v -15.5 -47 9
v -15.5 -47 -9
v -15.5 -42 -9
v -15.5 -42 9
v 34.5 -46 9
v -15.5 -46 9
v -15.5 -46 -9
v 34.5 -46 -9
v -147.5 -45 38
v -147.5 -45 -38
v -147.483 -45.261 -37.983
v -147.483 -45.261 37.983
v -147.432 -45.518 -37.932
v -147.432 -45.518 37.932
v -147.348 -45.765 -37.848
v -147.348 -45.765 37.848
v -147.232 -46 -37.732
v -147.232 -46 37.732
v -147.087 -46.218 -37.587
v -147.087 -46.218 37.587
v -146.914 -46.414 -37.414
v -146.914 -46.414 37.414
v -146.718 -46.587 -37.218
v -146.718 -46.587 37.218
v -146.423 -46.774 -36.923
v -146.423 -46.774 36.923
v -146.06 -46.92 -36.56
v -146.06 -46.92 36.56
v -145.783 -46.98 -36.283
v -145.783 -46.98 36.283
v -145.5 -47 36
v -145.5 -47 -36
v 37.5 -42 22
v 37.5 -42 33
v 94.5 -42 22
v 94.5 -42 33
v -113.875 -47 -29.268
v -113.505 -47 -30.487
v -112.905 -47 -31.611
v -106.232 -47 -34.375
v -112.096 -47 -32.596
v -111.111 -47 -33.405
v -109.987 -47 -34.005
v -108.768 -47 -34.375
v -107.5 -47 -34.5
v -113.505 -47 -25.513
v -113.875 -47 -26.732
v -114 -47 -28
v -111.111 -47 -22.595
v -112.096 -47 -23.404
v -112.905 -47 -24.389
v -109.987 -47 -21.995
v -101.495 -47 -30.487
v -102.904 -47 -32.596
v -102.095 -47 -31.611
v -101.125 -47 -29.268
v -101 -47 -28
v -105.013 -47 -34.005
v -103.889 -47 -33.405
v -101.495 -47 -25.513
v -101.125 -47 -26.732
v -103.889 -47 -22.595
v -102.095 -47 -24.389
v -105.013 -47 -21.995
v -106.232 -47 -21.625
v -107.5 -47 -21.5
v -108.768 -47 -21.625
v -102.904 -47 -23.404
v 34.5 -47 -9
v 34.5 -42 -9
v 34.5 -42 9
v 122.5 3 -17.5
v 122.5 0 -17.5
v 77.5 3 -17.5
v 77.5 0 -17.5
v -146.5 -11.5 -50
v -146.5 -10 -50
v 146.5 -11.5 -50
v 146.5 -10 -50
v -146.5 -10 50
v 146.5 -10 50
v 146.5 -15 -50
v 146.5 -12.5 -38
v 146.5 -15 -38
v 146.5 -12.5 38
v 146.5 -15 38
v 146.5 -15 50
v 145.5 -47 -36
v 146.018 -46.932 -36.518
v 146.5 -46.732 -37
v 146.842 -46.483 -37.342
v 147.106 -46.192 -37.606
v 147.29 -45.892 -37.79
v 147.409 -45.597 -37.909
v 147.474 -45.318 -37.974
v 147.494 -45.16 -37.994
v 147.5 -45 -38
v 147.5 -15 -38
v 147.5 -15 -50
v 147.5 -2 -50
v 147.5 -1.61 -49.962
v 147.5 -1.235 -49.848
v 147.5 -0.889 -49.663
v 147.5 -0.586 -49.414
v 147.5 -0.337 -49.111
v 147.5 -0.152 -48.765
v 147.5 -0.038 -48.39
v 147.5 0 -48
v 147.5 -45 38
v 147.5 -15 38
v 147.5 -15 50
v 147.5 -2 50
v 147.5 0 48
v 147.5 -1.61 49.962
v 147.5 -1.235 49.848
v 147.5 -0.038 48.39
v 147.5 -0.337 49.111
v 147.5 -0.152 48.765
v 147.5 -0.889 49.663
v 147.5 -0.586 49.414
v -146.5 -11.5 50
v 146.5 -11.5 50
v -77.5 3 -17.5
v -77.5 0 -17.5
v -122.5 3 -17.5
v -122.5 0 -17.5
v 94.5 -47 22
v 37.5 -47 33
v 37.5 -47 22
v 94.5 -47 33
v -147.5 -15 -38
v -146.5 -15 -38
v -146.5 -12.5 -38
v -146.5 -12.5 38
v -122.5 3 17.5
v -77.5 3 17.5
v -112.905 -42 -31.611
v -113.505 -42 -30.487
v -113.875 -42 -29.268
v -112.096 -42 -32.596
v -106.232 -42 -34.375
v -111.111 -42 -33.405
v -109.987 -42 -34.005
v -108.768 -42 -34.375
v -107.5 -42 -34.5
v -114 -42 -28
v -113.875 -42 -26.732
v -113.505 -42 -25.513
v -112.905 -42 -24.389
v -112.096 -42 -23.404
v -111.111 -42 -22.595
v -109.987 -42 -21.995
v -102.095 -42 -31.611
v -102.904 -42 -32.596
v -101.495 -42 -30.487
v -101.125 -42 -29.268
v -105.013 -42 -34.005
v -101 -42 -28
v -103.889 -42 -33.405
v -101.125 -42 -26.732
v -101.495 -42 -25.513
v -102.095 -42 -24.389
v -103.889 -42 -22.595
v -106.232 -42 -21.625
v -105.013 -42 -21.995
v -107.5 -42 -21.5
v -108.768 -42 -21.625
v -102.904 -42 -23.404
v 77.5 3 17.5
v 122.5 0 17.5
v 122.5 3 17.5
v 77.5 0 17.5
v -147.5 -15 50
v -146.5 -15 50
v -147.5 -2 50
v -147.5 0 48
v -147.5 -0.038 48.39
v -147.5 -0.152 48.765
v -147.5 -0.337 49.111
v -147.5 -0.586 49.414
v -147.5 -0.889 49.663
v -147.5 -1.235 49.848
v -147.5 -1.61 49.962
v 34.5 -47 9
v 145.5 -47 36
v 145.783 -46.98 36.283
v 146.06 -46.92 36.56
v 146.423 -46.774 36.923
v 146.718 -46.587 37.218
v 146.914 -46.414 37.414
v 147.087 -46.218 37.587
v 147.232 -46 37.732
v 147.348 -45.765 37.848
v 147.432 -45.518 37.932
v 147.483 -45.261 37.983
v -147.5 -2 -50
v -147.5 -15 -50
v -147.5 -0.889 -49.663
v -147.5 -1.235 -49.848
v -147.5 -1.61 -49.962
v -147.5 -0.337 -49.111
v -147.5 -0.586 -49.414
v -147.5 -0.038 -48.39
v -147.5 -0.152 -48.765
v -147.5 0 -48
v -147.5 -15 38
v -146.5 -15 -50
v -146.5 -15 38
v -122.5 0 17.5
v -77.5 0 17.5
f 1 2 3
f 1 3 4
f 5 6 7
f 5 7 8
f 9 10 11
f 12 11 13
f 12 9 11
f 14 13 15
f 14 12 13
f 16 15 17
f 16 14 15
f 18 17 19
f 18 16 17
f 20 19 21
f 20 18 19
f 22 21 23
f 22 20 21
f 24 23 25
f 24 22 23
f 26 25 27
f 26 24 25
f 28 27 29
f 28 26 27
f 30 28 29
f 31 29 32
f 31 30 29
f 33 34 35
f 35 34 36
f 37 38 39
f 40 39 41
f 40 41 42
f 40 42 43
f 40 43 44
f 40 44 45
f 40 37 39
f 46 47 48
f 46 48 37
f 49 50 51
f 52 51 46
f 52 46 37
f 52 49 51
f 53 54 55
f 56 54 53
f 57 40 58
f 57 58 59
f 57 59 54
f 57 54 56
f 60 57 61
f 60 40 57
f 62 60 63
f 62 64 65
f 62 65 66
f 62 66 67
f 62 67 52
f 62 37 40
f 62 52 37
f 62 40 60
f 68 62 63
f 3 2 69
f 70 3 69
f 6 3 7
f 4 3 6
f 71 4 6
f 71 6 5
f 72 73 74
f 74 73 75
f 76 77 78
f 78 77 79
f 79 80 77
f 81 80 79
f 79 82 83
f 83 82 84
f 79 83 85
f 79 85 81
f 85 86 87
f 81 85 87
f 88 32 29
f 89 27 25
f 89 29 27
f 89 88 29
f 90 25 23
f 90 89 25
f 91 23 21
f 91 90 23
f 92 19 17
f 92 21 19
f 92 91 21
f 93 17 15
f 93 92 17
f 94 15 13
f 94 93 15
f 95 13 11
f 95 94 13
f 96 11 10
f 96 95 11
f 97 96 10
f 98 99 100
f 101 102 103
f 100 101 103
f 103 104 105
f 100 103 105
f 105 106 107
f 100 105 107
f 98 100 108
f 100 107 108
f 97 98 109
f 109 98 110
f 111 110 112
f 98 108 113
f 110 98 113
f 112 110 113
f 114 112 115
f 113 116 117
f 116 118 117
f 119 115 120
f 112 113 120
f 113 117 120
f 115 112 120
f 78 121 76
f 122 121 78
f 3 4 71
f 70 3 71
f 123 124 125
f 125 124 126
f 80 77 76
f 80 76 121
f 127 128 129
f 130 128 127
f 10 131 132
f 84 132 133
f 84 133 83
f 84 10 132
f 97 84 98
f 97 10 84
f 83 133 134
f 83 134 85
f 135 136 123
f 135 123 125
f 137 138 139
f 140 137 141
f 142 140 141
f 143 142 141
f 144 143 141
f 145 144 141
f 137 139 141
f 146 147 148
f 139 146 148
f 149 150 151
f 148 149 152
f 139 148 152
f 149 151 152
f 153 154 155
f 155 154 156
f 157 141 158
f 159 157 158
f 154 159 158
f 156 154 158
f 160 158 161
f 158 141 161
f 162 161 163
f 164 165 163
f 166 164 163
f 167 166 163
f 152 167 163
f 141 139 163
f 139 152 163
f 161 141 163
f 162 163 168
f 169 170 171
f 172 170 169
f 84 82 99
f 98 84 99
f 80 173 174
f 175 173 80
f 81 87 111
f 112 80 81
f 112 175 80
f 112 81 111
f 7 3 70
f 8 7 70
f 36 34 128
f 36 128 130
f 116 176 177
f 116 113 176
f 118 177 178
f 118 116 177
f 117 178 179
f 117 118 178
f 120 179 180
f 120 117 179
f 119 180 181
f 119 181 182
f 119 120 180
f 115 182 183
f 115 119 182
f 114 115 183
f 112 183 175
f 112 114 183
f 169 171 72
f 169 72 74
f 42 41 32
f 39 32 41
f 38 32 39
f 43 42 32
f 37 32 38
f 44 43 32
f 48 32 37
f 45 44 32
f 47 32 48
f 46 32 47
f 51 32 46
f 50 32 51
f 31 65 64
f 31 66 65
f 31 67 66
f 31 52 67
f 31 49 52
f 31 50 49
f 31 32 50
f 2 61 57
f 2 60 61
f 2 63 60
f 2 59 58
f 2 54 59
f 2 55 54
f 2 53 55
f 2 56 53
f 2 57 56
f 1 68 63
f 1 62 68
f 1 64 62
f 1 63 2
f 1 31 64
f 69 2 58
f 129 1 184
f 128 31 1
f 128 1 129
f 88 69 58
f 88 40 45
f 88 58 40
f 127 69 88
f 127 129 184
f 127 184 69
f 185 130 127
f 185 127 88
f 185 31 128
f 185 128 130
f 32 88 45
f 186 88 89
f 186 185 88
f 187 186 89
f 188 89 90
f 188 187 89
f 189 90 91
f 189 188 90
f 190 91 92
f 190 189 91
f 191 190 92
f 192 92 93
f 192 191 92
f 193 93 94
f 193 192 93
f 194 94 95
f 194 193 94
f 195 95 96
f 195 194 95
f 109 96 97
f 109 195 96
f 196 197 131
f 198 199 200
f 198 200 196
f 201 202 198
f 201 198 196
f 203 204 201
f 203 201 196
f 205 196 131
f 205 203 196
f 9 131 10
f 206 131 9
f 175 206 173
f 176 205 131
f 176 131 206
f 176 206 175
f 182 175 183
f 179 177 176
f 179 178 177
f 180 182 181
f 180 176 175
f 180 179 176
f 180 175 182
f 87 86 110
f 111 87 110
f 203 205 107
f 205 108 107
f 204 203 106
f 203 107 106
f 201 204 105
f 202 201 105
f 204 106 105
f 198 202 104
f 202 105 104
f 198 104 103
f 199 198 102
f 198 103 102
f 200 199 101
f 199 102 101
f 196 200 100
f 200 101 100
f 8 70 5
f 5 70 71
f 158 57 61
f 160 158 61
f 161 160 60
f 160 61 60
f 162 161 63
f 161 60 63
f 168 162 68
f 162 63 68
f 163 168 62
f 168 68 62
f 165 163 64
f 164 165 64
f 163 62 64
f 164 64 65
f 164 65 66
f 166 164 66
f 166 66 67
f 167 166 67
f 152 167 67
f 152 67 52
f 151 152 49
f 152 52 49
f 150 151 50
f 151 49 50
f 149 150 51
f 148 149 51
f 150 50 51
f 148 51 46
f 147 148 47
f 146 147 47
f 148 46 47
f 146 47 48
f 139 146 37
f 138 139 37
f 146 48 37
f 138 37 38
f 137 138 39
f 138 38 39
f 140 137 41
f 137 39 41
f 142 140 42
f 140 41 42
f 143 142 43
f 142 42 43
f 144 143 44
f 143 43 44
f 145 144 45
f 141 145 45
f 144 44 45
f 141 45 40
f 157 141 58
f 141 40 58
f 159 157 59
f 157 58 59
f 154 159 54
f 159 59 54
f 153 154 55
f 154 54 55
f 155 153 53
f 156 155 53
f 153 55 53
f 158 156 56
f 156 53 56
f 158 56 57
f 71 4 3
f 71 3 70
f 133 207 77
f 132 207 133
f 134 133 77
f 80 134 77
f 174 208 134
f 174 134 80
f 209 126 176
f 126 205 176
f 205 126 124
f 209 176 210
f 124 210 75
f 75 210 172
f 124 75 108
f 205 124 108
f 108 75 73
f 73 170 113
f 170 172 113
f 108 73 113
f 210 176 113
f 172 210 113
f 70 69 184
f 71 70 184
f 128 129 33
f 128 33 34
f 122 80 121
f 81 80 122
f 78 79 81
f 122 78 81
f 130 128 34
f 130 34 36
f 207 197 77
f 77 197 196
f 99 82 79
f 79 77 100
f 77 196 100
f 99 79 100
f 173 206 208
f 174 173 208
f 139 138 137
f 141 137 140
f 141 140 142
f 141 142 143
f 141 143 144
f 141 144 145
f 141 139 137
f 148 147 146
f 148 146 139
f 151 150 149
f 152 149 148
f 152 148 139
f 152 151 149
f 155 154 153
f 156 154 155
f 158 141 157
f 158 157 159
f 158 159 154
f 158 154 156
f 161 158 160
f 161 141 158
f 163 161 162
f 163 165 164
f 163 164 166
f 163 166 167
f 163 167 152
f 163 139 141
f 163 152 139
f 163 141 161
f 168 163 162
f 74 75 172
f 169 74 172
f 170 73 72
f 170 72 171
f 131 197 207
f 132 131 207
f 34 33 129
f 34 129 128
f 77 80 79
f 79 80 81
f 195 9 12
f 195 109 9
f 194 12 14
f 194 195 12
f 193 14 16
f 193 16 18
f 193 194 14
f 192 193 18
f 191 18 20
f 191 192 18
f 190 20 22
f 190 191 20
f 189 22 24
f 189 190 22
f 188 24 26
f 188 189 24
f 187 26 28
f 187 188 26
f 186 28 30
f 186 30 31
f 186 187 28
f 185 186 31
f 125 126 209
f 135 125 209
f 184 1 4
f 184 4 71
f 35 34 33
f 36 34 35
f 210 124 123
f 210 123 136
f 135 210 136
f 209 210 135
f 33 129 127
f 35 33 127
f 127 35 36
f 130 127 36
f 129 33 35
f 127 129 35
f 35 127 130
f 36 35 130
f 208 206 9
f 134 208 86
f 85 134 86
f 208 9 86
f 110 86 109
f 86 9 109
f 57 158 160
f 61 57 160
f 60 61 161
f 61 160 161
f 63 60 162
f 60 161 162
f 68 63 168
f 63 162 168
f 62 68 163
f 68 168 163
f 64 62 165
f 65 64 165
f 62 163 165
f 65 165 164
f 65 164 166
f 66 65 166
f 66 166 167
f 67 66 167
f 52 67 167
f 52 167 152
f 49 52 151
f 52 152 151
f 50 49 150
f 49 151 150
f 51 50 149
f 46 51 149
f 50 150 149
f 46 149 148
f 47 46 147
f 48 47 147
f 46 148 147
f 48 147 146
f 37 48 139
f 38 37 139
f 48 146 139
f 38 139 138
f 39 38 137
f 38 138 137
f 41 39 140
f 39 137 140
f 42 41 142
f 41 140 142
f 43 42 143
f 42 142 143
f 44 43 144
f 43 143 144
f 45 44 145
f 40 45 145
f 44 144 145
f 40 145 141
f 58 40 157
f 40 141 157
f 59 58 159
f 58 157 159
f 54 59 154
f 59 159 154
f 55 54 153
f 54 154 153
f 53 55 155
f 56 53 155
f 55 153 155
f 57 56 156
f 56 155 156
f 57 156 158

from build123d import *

# Parameters (mm, degrees)
F0_W         = 295
F0_H         = 100
F1_DEPTH     = 47
F2_W         = 295
F2_H         = 12
F3_DEPTH     = 32
F4_W         = 293
F4_H         = 12
F5_W         = 293
F5_H         = 12
F6_DEPTH     = 5
F7_W         = 293
F7_H         = 2.5
F8_DEPTH     = 88.001
F9_W         = 50
F9_H         = 18
F9_R         = 6.5
F9_W_2       = 57
F9_H_2       = 11
F10_DEPTH    = 5
F10_FACE_W   = 50
F10_FACE_H   = 18
F11_DEPTH    = 4
F10_FACE_R   = 6.5
F10_FACE_W_2 = 57
F10_FACE_H_2 = 11
F12_DEPTH    = 5
F8_FACE_W    = 293
F8_FACE_H    = 100
F13_DEPTH    = 1.5
F14_W        = 45
F14_H        = 35
F15_DEPTH    = 3
F16_R        = 2


with BuildPart() as f1:
    # F0 (on Front) → F1 (new body)
    with BuildSketch(Plane.XZ):
        Rectangle(F0_W, F0_H)
    extrude(amount=F1_DEPTH)

    # F2 (on face) → F3 (cut)
    with BuildSketch(Plane.XZ.offset(47)):
        with Locations((0, -44)):
            Rectangle(F2_W, F2_H)
        with Locations((0, 44)):
            Rectangle(F2_W, F2_H)
    extrude(amount=-F3_DEPTH, mode=Mode.SUBTRACT)

    # F4 (on face) + F5 (on face) → F6 (cut)
    with BuildSketch(Plane.XZ.offset(15)):
        with Locations((0, 44)):
            Rectangle(F4_W, F4_H)
    with BuildSketch(Plane.XZ.offset(15)):
        with Locations((0, -44)):
            Rectangle(F5_W, F5_H)
    extrude(amount=-F6_DEPTH, mode=Mode.SUBTRACT)

    # F7 (on face) → F8 (cut, through all)
    with BuildSketch(Plane(origin=(0, 0, -38), x_dir=(1, 0, 0), z_dir=(0, 0, -1))):
        with Locations((0, 11.25)):
            Rectangle(F7_W, F7_H)
    extrude(amount=-F8_DEPTH, mode=Mode.SUBTRACT)

    # F9 (on face) → F10 (cut)
    with BuildSketch(Plane.XZ.offset(47)):
        with Locations((9.5, 0)):
            Rectangle(F9_W, F9_H)
        with Locations((-107.5, -28)):
            Circle(F9_R)
        with Locations((66, 27.5)):
            Rectangle(F9_W_2, F9_H_2)
    extrude(amount=-F10_DEPTH, mode=Mode.SUBTRACT)

    # F14 (on face) → F15 (join)
    with BuildSketch(Plane(origin=(0, 0, 0), x_dir=(-1, 0, 0), z_dir=(0, 1, 0))):
        with Locations((-100, 0)):
            Rectangle(F14_W, F14_H)
        with Locations((100, 0)):
            Rectangle(F14_W, F14_H)
    extrude(amount=F15_DEPTH)

    # F16
    f16_edges = [f1.edges().sort_by_distance(p)[0] for p in [
        (0, -47, 38),
        (147.5, -47, 0),
        (-147.5, -47, 0),
        (0, -47, -38),
        (0, 0, 50),
        (0, 0, -50),
    ]]
    fillet(f16_edges, radius=F16_R)


with BuildPart() as f11:
    # F10_face (on face) → F11 (new body)
    with BuildSketch(Plane(origin=(9.5, -42, 0), x_dir=(1, 0, 0), z_dir=(0, -1, 0))):
        Rectangle(F10_FACE_W, F10_FACE_H)
    extrude(amount=F11_DEPTH)


with BuildPart() as f12:
    # F10_face (on face) → F12 (new body, through all)
    with BuildSketch(Plane(origin=(9.5, -42, 0), x_dir=(1, 0, 0), z_dir=(0, -1, 0))):
        with Locations((-117, -28)):
            Circle(F10_FACE_R)
        with Locations((56.5, 27.5)):
            Rectangle(F10_FACE_W_2, F10_FACE_H_2)
    extrude(amount=F12_DEPTH)


with BuildPart() as f13:
    # F8_face (on face) → F13 (new body)
    with BuildSketch(Plane.XZ.offset(10)):
        Rectangle(F8_FACE_W, F8_FACE_H)
    extrude(amount=F13_DEPTH)


solid = Compound([f1.part, f11.part, f12.part, f13.part])
